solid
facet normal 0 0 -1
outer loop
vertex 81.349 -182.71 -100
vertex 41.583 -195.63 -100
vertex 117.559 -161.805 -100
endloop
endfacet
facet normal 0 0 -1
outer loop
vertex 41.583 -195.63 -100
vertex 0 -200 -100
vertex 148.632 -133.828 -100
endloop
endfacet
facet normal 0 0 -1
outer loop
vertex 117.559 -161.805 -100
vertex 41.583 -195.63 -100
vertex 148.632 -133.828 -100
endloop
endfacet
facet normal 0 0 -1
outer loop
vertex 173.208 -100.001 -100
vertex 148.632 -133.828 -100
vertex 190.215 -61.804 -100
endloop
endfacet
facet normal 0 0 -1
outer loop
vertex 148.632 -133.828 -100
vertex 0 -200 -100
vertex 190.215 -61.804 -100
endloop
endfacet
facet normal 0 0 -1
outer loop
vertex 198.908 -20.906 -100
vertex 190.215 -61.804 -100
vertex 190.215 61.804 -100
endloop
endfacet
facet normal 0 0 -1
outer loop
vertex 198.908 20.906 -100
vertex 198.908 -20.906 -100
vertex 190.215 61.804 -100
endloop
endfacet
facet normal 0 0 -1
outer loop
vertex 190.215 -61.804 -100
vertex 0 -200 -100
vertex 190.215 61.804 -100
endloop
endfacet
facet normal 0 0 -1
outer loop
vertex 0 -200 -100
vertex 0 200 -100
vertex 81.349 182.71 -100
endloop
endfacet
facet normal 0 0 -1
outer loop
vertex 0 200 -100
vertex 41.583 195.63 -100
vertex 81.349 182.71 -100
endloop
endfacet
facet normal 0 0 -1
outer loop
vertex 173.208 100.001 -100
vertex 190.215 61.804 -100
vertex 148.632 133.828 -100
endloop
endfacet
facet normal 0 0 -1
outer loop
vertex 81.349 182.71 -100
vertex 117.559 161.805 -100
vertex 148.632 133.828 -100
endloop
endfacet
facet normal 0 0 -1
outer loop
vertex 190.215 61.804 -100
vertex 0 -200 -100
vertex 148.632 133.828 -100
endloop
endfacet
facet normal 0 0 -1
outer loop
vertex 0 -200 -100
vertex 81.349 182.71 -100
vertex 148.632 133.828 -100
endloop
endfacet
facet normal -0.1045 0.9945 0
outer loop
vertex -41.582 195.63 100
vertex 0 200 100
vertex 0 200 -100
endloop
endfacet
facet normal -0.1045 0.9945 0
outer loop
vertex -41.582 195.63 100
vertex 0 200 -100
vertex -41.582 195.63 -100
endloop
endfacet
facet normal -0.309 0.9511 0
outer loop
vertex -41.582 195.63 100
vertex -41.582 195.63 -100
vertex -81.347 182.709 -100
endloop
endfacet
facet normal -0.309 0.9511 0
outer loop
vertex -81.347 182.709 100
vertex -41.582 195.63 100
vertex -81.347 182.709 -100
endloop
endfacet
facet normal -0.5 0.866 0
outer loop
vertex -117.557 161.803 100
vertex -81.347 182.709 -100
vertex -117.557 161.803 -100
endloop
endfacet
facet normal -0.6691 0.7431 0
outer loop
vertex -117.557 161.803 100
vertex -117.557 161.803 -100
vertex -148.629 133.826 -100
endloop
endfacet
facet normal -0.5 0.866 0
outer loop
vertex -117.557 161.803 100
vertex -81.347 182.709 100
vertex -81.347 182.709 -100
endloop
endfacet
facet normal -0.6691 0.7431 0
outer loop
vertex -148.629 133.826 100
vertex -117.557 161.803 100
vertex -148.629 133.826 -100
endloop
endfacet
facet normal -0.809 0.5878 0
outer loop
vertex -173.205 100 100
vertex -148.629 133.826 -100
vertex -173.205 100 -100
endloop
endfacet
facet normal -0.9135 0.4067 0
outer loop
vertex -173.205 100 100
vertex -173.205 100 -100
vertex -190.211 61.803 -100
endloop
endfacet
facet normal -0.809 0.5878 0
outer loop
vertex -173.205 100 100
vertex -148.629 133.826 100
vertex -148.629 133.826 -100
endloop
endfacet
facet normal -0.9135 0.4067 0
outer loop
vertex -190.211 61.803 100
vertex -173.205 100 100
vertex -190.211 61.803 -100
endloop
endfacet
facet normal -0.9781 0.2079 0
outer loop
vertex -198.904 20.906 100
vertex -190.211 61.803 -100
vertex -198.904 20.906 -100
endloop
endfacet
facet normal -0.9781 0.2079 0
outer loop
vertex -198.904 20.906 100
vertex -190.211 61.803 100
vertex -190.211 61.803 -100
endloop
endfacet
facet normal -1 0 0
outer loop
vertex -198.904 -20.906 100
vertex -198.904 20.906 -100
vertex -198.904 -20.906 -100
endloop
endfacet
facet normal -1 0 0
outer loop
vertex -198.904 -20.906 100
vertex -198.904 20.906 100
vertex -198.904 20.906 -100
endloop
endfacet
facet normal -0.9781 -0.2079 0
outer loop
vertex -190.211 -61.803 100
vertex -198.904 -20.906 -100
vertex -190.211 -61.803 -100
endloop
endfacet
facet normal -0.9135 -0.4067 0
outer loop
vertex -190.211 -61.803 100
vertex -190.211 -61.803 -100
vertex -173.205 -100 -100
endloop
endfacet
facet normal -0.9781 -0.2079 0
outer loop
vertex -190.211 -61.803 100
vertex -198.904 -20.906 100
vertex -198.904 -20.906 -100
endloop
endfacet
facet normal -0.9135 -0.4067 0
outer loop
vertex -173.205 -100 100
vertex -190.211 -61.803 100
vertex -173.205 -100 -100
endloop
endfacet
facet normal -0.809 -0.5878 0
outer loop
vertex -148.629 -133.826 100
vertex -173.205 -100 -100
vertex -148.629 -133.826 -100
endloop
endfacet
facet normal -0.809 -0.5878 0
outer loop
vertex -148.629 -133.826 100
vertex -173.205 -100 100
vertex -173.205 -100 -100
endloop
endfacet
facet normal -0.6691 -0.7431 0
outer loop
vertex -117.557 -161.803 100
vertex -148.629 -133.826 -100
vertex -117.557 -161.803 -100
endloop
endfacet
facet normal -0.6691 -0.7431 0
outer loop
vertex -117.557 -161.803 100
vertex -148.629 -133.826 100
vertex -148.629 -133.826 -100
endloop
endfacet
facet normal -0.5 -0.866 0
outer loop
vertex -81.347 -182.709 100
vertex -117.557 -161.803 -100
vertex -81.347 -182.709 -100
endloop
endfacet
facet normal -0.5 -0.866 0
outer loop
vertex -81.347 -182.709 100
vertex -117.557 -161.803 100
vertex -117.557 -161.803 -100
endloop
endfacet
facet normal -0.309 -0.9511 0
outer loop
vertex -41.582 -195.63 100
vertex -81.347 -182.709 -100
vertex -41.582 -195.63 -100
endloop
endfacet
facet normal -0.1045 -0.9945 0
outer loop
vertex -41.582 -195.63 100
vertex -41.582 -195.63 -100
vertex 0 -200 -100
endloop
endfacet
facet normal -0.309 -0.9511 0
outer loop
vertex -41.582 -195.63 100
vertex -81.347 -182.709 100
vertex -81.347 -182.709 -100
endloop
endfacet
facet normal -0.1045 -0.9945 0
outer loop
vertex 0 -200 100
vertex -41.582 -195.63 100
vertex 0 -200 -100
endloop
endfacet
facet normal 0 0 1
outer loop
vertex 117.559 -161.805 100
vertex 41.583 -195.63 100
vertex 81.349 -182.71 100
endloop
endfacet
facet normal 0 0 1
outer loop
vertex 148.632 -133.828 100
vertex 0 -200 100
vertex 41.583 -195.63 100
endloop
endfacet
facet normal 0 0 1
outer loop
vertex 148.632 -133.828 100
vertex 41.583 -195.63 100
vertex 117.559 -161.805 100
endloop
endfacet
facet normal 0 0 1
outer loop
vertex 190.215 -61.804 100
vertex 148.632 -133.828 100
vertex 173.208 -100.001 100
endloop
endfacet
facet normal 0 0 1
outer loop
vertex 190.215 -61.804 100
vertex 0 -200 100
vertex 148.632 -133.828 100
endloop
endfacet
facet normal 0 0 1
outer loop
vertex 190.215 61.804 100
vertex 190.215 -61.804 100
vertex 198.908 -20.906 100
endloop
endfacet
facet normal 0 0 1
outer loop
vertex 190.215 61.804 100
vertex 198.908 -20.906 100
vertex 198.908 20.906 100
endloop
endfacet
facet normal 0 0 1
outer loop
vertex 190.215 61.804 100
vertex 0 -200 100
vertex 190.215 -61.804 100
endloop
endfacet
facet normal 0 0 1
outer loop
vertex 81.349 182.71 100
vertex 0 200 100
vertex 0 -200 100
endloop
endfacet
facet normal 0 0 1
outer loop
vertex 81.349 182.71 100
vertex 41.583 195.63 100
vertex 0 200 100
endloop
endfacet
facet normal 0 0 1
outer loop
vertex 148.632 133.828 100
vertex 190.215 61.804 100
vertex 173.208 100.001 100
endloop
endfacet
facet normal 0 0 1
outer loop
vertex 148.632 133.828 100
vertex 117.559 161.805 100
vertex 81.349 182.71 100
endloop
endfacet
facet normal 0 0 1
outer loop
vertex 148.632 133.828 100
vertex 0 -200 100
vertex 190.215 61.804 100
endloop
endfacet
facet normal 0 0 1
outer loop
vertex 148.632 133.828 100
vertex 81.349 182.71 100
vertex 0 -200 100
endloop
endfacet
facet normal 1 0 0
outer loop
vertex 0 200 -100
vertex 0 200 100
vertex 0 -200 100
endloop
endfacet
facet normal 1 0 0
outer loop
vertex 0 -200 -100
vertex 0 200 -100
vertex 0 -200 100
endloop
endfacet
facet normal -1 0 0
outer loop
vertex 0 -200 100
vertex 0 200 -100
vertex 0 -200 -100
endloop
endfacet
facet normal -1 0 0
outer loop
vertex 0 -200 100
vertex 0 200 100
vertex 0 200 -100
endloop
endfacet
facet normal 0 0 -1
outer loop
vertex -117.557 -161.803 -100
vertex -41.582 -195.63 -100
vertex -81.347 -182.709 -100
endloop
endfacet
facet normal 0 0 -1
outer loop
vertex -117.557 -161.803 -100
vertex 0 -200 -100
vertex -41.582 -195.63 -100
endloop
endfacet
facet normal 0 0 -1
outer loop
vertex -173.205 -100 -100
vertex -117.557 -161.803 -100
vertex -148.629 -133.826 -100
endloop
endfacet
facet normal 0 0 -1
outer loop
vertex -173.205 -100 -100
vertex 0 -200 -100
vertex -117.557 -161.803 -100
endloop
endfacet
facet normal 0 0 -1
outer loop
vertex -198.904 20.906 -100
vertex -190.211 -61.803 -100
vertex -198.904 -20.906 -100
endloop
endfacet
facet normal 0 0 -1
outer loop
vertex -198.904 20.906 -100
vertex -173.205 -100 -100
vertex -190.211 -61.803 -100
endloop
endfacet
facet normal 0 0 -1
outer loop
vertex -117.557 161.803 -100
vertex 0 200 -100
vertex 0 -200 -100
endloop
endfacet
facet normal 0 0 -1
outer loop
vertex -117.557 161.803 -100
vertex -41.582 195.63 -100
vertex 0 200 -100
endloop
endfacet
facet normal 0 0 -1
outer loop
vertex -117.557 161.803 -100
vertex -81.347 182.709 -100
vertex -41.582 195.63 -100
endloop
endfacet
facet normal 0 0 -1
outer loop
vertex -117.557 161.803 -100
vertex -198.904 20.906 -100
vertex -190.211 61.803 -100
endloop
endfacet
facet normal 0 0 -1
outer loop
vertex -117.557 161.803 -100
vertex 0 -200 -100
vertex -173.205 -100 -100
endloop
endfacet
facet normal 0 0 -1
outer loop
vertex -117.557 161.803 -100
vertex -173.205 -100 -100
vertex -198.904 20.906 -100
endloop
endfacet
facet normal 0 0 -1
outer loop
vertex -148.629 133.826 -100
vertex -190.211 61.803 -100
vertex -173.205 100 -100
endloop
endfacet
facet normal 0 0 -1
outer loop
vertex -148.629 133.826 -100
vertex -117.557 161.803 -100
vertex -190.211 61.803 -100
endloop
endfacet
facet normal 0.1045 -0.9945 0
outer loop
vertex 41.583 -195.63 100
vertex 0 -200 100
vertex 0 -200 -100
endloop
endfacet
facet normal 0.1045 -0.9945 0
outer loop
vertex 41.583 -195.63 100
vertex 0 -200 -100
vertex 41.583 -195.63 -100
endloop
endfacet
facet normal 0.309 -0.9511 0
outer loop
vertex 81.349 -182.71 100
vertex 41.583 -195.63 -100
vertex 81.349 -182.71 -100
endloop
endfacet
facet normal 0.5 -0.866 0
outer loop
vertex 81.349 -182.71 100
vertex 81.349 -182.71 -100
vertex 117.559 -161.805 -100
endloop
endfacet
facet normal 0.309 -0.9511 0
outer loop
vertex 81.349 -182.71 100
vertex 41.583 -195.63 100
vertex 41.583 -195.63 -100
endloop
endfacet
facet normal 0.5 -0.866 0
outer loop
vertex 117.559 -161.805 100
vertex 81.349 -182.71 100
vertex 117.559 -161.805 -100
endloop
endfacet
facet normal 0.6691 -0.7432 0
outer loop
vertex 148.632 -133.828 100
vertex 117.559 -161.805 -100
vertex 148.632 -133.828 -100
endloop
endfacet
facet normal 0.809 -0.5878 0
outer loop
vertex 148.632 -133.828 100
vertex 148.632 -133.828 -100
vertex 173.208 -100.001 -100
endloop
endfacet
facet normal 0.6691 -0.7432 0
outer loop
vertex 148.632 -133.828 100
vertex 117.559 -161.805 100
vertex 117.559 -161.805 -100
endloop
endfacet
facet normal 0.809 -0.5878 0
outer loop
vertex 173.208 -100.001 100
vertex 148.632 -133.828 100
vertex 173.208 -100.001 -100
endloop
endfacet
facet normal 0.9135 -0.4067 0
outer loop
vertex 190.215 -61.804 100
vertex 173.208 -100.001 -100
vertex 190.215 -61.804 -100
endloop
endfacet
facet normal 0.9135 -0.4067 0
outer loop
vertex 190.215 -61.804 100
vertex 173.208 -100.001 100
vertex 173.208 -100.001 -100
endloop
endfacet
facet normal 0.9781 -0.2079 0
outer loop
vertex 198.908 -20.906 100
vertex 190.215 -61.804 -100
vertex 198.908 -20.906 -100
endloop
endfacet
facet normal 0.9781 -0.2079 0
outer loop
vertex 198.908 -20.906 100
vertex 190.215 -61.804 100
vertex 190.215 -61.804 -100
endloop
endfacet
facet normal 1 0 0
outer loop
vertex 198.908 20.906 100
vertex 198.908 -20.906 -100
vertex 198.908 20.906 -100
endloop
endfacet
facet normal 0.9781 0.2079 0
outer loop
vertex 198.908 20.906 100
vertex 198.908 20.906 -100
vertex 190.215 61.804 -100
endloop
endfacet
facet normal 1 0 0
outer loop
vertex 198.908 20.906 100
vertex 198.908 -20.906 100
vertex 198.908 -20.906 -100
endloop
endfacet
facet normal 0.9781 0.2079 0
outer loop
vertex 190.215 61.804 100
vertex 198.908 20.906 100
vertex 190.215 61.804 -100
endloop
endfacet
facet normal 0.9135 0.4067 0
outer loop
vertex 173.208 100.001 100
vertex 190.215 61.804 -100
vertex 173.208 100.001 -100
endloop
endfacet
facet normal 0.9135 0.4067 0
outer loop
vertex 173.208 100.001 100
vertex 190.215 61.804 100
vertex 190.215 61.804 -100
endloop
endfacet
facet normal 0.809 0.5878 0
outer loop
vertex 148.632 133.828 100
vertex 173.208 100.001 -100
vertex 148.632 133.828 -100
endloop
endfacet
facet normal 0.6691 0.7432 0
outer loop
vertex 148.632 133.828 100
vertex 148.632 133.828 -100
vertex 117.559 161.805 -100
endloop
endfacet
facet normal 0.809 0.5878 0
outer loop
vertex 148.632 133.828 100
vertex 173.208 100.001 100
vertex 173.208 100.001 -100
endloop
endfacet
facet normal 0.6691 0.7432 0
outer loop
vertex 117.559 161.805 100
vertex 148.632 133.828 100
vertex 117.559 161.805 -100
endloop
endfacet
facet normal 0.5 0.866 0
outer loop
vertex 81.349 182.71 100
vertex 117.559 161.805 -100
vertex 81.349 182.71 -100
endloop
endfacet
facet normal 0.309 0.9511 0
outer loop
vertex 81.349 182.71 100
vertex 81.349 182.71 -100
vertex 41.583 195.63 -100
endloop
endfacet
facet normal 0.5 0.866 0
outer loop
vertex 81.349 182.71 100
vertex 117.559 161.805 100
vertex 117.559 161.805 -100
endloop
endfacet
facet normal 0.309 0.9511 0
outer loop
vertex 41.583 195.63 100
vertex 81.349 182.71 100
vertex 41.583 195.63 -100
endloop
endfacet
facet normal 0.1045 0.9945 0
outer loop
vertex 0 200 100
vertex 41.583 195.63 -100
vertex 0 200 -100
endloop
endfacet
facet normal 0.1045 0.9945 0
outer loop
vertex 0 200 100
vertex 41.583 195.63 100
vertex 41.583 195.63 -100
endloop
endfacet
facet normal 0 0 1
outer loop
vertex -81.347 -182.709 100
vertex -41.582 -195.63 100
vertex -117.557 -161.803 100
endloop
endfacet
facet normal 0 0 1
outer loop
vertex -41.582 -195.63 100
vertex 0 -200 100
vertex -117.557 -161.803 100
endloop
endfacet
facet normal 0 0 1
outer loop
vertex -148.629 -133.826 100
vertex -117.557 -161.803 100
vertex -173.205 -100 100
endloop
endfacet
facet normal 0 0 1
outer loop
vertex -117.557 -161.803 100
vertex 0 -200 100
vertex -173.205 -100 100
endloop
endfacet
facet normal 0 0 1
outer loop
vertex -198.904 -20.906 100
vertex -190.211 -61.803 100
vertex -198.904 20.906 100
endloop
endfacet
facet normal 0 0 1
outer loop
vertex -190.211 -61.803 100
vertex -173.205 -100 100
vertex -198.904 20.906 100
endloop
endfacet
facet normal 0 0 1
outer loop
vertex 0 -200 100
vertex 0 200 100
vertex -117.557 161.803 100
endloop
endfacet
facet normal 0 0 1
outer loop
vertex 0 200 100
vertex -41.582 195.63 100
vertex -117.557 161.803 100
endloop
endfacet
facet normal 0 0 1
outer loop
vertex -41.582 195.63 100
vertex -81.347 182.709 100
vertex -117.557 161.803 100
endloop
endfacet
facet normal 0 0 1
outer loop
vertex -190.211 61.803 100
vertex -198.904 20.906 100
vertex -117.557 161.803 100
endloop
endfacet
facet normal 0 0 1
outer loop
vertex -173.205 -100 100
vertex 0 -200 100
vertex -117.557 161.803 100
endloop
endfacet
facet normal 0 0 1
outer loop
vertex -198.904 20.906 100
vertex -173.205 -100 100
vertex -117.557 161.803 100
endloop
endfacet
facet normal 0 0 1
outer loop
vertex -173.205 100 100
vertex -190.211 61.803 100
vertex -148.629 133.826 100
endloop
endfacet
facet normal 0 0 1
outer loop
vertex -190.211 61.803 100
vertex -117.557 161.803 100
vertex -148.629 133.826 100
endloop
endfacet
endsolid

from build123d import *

# Parameters (mm, degrees)
PAD_DEPTH    = 100
PAD001_DEPTH = 100


with BuildPart() as body1:
    # Sketch → Pad (new body, symmetric)
    with BuildSketch(Plane.XY):
        with BuildLine():
            Line((0, 200), (0, -200))
            ThreePointArc((0, 200), (-200, 0), (0, -200))
        make_face()
    extrude(amount=PAD_DEPTH, both=True)


with BuildPart() as body2:
    # Sketch001 → Pad001 (new body, symmetric)
    with BuildSketch(Plane.XY):
        with BuildLine():
            Line((0, 200), (0, -200))
            ThreePointArc((0, -200), (200.004055, 0), (0, 200))
        make_face()
    extrude(amount=PAD001_DEPTH, both=True)


solid = Compound([body1.part, body2.part])
